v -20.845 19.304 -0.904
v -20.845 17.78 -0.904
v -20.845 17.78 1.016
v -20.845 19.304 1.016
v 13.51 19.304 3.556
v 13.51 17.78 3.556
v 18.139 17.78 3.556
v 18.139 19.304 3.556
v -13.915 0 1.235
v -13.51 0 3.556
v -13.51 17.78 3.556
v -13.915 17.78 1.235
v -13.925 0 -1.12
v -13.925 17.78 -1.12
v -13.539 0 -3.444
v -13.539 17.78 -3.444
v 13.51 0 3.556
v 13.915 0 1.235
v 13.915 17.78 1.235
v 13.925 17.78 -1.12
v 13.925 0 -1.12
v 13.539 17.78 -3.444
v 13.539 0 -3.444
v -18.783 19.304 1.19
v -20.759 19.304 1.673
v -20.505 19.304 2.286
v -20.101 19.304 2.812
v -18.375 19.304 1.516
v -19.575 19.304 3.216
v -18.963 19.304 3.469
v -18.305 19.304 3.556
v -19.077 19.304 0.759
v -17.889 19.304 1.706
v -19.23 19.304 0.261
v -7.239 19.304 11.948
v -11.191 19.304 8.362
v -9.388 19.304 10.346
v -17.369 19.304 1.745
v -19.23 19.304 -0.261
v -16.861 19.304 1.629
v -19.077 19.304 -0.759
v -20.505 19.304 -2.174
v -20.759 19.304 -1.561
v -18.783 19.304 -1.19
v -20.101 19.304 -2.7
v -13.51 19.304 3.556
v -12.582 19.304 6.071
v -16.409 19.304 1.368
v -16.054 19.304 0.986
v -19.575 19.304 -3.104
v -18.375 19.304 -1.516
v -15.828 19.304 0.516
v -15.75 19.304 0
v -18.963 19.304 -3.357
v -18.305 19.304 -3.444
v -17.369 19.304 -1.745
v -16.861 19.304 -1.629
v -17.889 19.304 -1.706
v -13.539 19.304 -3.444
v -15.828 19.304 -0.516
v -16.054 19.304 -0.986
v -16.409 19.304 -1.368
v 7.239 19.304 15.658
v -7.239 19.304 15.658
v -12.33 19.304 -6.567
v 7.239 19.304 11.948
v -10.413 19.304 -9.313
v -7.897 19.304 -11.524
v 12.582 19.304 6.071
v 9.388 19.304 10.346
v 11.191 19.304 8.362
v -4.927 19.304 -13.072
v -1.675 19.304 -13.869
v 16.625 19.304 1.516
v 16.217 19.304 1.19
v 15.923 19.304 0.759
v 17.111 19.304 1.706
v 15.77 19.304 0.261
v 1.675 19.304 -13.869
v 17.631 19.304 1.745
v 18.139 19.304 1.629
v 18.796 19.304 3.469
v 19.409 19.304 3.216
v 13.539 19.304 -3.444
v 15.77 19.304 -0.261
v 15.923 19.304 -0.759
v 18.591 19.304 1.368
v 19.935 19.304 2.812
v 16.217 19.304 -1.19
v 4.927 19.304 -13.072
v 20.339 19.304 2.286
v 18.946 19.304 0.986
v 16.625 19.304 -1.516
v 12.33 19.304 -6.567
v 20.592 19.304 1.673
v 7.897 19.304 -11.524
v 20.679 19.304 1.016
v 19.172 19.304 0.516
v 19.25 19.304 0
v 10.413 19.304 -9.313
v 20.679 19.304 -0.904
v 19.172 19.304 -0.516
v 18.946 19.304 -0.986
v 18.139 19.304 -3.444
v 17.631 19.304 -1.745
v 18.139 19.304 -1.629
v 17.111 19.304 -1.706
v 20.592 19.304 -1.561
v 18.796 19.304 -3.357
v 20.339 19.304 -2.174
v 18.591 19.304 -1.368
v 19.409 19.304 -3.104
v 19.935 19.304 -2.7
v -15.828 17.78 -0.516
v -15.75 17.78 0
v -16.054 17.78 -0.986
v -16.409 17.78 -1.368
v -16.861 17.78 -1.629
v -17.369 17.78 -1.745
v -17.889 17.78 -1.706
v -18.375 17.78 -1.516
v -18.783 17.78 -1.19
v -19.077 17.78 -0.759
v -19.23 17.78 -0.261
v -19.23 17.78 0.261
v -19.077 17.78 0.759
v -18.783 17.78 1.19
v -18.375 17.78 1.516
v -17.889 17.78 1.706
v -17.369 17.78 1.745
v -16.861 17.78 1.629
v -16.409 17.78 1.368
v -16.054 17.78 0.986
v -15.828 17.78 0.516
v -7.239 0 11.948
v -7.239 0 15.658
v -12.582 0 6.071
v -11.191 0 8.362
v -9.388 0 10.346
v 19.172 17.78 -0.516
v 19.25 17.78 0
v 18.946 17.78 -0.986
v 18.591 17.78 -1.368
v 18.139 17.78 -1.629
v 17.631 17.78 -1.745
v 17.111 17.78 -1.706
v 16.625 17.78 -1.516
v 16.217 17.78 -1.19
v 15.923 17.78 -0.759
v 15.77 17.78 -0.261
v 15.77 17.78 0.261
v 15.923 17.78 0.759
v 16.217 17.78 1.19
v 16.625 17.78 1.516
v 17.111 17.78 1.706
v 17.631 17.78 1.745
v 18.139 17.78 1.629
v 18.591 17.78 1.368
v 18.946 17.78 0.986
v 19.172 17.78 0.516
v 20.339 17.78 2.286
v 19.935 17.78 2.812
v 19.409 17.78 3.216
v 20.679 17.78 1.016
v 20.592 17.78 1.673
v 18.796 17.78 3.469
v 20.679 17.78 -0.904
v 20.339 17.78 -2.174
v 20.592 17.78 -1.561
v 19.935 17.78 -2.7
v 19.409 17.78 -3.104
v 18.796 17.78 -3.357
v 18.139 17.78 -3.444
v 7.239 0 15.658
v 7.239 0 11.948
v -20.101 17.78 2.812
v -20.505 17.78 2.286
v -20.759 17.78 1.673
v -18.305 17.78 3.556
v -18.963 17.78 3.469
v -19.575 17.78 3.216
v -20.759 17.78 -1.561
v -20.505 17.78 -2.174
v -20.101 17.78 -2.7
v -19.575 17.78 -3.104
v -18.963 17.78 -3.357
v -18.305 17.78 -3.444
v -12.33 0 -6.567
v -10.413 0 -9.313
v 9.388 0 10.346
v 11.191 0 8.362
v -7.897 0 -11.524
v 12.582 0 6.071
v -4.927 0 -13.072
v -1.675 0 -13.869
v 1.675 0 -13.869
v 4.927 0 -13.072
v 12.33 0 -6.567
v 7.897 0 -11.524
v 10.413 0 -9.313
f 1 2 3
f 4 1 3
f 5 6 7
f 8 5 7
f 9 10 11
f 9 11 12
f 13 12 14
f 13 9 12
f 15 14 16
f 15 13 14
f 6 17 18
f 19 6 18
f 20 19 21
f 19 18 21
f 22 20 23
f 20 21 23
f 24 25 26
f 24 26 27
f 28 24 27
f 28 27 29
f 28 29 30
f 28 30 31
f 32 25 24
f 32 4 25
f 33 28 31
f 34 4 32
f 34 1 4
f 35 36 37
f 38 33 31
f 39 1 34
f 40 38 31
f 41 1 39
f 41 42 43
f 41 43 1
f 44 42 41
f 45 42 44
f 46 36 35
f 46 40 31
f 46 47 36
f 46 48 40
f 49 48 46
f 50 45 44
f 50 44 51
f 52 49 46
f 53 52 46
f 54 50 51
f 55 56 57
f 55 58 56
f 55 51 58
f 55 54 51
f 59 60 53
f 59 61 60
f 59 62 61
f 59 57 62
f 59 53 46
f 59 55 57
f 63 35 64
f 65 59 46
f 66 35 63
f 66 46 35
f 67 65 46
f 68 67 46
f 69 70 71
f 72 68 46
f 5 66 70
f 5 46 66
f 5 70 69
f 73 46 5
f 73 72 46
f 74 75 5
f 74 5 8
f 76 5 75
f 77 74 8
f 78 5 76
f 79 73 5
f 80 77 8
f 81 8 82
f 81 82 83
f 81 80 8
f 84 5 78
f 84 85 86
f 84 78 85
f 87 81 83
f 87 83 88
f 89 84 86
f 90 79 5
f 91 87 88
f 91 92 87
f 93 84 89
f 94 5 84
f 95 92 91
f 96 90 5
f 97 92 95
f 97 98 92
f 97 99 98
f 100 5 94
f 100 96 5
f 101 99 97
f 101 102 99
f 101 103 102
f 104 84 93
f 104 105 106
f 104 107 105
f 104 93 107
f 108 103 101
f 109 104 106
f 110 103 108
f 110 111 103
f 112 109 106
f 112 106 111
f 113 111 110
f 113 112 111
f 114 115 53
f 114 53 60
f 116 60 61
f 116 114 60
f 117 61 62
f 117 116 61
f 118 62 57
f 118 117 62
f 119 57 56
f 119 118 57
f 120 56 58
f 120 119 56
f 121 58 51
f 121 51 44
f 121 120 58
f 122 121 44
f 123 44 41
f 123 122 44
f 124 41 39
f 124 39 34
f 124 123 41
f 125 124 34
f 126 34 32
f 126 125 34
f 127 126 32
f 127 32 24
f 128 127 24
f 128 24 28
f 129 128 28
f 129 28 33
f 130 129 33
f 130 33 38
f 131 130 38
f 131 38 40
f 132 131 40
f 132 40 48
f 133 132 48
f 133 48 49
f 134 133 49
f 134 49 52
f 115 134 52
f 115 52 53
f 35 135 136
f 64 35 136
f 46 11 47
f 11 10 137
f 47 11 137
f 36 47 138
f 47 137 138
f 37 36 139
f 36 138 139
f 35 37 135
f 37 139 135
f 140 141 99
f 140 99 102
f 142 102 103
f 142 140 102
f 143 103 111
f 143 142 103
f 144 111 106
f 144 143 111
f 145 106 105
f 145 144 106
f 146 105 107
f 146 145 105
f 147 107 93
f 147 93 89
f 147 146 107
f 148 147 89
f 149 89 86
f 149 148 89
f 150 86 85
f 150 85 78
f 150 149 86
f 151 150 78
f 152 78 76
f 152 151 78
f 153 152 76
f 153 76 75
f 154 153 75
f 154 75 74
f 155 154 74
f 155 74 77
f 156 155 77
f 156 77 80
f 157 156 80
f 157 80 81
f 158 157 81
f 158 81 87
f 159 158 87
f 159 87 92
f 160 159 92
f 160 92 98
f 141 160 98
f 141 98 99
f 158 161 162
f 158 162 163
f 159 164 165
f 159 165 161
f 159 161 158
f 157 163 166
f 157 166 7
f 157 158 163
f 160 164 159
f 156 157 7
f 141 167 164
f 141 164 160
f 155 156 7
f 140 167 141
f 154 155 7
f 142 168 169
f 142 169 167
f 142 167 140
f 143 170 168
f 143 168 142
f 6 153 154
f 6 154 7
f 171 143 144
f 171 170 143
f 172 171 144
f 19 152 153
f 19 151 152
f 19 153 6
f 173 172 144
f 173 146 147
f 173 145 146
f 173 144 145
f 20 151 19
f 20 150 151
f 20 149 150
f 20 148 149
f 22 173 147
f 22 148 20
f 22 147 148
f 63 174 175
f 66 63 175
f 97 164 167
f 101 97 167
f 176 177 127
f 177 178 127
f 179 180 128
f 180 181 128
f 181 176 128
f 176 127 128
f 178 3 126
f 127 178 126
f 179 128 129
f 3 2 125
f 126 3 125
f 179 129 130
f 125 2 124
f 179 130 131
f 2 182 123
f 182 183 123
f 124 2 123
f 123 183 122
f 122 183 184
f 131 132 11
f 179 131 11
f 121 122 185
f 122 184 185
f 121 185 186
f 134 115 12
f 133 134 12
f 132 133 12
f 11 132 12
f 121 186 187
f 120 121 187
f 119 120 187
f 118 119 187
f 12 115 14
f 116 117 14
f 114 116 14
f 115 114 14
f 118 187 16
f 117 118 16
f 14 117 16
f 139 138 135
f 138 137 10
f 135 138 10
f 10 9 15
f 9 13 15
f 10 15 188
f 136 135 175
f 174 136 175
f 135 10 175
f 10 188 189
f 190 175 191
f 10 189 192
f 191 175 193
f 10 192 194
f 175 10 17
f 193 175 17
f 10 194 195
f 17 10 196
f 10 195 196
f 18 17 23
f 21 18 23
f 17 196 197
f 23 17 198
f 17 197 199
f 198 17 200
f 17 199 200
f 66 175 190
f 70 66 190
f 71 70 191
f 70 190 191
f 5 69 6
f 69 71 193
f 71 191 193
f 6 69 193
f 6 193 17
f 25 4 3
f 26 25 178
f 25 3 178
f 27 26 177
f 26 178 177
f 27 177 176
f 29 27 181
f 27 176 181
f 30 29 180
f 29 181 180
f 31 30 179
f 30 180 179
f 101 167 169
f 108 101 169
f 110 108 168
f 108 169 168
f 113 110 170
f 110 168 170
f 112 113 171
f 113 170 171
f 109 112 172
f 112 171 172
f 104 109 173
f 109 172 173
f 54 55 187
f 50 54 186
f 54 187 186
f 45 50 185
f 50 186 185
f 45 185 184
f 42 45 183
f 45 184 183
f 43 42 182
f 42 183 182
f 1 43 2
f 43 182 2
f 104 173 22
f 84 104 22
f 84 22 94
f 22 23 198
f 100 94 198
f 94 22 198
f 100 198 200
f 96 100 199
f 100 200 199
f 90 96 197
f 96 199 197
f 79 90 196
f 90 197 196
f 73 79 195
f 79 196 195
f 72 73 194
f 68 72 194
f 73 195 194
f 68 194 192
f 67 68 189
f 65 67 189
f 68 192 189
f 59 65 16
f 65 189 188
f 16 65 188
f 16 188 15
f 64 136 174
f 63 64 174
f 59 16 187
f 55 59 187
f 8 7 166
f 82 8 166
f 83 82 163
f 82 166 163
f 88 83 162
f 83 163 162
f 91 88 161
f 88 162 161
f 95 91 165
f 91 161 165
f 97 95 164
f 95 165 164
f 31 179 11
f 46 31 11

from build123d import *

# Parameters (mm, degrees)
SKETCH1_R           = 1.75
BOSS_EXTRUDE1_DEPTH = 19.304
CUT_EXTRUDE1_START  = -19.304
CUT_EXTRUDE1_DEPTH  = 17.78


with BuildPart() as part:
    # Sketch1 → Boss-Extrude1 (new body)
    with BuildSketch(Plane(origin=(0, 0, 0), x_dir=(1, 0, 0), z_dir=(0, 1, 0))):
        with BuildLine():
            Line((-7.239, -11.948128682), (-7.239, -15.65830815))
            Line((-7.239, -15.65830815), (7.239, -15.65830815))
            Line((7.239, -15.65830815), (7.239, -11.948128682))
            ThreePointArc((7.239, -11.948128682), (11.19086866, -8.362138401), (13.509839525, -3.556))
            Line((13.509839525, -3.556), (18.139005902, -3.556))
            ThreePointArc((18.139005902, -3.556), (19.935057126, -2.812051224), (20.679005902, -1.016))
            Line((20.679005902, -1.016), (20.679005902, 0.904))
            ThreePointArc((20.679005902, 0.904), (19.935057126, 2.700051224), (18.139005902, 3.444))
            Line((18.139005902, 3.444), (13.538824321, 3.444))
            ThreePointArc((13.538824321, 3.444), (0, 13.97), (-13.538824321, 3.444))
            Line((-13.538824321, 3.444), (-18.305445148, 3.444))
            ThreePointArc((-18.305445148, 3.444), (-20.101496373, 2.700051224), (-20.845445148, 0.904))
            Line((-20.845445148, 0.904), (-20.845445148, -1.016))
            ThreePointArc((-20.845445148, -1.016), (-20.101496373, -2.812051224), (-18.305445148, -3.556))
            Line((-18.305445148, -3.556), (-13.509839525, -3.556))
            ThreePointArc((-13.509839525, -3.556), (-11.19086866, -8.362138401), (-7.239, -11.948128682))
        make_face()
        with Locations((17.499965, 0)):
            Circle(SKETCH1_R, mode=Mode.SUBTRACT)
        with Locations((-17.499965, 0)):
            Circle(SKETCH1_R, mode=Mode.SUBTRACT)
    extrude(amount=BOSS_EXTRUDE1_DEPTH)

    # Sketch2 → Cut-Extrude1 (cut)
    with BuildSketch(Plane(origin=(0, 19.304, 0), x_dir=(1, 0, 0), z_dir=(0, 1, 0)).offset(CUT_EXTRUDE1_START)):
        with BuildLine():
            Line((-13.538824321, 3.444), (-18.305445148, 3.444))
            Line((-18.305445148, 3.444), (-22.379136798, 3.444))
            Line((-22.379136798, 3.444), (-22.379136798, -3.598718101))
            Line((-22.379136798, -3.598718101), (-18.305445148, -3.556))
            Line((-18.305445148, -3.556), (-13.509839525, -3.556))
            ThreePointArc((-13.509839525, -3.556), (-13.969880242, -0.057844875), (-13.538824321, 3.444))
        make_face()
        with BuildLine():
            Line((18.305445148, -3.556), (13.509839525, -3.556))
            ThreePointArc((13.509839525, -3.556), (13.969880242, -0.057844875), (13.538824321, 3.444))
            Line((13.538824321, 3.444), (18.305445148, 3.444))
            ThreePointArc((18.305445148, 3.444), (20.101496373, 2.700051224), (20.845445148, 0.904))
            Line((20.845445148, 0.904), (20.777862254, -1.598025477))
            ThreePointArc((20.777862254, -1.598025477), (19.998954522, -3.154465794), (18.305445148, -3.556))
        make_face()
    extrude(amount=CUT_EXTRUDE1_DEPTH, mode=Mode.SUBTRACT)


solid = part.part
